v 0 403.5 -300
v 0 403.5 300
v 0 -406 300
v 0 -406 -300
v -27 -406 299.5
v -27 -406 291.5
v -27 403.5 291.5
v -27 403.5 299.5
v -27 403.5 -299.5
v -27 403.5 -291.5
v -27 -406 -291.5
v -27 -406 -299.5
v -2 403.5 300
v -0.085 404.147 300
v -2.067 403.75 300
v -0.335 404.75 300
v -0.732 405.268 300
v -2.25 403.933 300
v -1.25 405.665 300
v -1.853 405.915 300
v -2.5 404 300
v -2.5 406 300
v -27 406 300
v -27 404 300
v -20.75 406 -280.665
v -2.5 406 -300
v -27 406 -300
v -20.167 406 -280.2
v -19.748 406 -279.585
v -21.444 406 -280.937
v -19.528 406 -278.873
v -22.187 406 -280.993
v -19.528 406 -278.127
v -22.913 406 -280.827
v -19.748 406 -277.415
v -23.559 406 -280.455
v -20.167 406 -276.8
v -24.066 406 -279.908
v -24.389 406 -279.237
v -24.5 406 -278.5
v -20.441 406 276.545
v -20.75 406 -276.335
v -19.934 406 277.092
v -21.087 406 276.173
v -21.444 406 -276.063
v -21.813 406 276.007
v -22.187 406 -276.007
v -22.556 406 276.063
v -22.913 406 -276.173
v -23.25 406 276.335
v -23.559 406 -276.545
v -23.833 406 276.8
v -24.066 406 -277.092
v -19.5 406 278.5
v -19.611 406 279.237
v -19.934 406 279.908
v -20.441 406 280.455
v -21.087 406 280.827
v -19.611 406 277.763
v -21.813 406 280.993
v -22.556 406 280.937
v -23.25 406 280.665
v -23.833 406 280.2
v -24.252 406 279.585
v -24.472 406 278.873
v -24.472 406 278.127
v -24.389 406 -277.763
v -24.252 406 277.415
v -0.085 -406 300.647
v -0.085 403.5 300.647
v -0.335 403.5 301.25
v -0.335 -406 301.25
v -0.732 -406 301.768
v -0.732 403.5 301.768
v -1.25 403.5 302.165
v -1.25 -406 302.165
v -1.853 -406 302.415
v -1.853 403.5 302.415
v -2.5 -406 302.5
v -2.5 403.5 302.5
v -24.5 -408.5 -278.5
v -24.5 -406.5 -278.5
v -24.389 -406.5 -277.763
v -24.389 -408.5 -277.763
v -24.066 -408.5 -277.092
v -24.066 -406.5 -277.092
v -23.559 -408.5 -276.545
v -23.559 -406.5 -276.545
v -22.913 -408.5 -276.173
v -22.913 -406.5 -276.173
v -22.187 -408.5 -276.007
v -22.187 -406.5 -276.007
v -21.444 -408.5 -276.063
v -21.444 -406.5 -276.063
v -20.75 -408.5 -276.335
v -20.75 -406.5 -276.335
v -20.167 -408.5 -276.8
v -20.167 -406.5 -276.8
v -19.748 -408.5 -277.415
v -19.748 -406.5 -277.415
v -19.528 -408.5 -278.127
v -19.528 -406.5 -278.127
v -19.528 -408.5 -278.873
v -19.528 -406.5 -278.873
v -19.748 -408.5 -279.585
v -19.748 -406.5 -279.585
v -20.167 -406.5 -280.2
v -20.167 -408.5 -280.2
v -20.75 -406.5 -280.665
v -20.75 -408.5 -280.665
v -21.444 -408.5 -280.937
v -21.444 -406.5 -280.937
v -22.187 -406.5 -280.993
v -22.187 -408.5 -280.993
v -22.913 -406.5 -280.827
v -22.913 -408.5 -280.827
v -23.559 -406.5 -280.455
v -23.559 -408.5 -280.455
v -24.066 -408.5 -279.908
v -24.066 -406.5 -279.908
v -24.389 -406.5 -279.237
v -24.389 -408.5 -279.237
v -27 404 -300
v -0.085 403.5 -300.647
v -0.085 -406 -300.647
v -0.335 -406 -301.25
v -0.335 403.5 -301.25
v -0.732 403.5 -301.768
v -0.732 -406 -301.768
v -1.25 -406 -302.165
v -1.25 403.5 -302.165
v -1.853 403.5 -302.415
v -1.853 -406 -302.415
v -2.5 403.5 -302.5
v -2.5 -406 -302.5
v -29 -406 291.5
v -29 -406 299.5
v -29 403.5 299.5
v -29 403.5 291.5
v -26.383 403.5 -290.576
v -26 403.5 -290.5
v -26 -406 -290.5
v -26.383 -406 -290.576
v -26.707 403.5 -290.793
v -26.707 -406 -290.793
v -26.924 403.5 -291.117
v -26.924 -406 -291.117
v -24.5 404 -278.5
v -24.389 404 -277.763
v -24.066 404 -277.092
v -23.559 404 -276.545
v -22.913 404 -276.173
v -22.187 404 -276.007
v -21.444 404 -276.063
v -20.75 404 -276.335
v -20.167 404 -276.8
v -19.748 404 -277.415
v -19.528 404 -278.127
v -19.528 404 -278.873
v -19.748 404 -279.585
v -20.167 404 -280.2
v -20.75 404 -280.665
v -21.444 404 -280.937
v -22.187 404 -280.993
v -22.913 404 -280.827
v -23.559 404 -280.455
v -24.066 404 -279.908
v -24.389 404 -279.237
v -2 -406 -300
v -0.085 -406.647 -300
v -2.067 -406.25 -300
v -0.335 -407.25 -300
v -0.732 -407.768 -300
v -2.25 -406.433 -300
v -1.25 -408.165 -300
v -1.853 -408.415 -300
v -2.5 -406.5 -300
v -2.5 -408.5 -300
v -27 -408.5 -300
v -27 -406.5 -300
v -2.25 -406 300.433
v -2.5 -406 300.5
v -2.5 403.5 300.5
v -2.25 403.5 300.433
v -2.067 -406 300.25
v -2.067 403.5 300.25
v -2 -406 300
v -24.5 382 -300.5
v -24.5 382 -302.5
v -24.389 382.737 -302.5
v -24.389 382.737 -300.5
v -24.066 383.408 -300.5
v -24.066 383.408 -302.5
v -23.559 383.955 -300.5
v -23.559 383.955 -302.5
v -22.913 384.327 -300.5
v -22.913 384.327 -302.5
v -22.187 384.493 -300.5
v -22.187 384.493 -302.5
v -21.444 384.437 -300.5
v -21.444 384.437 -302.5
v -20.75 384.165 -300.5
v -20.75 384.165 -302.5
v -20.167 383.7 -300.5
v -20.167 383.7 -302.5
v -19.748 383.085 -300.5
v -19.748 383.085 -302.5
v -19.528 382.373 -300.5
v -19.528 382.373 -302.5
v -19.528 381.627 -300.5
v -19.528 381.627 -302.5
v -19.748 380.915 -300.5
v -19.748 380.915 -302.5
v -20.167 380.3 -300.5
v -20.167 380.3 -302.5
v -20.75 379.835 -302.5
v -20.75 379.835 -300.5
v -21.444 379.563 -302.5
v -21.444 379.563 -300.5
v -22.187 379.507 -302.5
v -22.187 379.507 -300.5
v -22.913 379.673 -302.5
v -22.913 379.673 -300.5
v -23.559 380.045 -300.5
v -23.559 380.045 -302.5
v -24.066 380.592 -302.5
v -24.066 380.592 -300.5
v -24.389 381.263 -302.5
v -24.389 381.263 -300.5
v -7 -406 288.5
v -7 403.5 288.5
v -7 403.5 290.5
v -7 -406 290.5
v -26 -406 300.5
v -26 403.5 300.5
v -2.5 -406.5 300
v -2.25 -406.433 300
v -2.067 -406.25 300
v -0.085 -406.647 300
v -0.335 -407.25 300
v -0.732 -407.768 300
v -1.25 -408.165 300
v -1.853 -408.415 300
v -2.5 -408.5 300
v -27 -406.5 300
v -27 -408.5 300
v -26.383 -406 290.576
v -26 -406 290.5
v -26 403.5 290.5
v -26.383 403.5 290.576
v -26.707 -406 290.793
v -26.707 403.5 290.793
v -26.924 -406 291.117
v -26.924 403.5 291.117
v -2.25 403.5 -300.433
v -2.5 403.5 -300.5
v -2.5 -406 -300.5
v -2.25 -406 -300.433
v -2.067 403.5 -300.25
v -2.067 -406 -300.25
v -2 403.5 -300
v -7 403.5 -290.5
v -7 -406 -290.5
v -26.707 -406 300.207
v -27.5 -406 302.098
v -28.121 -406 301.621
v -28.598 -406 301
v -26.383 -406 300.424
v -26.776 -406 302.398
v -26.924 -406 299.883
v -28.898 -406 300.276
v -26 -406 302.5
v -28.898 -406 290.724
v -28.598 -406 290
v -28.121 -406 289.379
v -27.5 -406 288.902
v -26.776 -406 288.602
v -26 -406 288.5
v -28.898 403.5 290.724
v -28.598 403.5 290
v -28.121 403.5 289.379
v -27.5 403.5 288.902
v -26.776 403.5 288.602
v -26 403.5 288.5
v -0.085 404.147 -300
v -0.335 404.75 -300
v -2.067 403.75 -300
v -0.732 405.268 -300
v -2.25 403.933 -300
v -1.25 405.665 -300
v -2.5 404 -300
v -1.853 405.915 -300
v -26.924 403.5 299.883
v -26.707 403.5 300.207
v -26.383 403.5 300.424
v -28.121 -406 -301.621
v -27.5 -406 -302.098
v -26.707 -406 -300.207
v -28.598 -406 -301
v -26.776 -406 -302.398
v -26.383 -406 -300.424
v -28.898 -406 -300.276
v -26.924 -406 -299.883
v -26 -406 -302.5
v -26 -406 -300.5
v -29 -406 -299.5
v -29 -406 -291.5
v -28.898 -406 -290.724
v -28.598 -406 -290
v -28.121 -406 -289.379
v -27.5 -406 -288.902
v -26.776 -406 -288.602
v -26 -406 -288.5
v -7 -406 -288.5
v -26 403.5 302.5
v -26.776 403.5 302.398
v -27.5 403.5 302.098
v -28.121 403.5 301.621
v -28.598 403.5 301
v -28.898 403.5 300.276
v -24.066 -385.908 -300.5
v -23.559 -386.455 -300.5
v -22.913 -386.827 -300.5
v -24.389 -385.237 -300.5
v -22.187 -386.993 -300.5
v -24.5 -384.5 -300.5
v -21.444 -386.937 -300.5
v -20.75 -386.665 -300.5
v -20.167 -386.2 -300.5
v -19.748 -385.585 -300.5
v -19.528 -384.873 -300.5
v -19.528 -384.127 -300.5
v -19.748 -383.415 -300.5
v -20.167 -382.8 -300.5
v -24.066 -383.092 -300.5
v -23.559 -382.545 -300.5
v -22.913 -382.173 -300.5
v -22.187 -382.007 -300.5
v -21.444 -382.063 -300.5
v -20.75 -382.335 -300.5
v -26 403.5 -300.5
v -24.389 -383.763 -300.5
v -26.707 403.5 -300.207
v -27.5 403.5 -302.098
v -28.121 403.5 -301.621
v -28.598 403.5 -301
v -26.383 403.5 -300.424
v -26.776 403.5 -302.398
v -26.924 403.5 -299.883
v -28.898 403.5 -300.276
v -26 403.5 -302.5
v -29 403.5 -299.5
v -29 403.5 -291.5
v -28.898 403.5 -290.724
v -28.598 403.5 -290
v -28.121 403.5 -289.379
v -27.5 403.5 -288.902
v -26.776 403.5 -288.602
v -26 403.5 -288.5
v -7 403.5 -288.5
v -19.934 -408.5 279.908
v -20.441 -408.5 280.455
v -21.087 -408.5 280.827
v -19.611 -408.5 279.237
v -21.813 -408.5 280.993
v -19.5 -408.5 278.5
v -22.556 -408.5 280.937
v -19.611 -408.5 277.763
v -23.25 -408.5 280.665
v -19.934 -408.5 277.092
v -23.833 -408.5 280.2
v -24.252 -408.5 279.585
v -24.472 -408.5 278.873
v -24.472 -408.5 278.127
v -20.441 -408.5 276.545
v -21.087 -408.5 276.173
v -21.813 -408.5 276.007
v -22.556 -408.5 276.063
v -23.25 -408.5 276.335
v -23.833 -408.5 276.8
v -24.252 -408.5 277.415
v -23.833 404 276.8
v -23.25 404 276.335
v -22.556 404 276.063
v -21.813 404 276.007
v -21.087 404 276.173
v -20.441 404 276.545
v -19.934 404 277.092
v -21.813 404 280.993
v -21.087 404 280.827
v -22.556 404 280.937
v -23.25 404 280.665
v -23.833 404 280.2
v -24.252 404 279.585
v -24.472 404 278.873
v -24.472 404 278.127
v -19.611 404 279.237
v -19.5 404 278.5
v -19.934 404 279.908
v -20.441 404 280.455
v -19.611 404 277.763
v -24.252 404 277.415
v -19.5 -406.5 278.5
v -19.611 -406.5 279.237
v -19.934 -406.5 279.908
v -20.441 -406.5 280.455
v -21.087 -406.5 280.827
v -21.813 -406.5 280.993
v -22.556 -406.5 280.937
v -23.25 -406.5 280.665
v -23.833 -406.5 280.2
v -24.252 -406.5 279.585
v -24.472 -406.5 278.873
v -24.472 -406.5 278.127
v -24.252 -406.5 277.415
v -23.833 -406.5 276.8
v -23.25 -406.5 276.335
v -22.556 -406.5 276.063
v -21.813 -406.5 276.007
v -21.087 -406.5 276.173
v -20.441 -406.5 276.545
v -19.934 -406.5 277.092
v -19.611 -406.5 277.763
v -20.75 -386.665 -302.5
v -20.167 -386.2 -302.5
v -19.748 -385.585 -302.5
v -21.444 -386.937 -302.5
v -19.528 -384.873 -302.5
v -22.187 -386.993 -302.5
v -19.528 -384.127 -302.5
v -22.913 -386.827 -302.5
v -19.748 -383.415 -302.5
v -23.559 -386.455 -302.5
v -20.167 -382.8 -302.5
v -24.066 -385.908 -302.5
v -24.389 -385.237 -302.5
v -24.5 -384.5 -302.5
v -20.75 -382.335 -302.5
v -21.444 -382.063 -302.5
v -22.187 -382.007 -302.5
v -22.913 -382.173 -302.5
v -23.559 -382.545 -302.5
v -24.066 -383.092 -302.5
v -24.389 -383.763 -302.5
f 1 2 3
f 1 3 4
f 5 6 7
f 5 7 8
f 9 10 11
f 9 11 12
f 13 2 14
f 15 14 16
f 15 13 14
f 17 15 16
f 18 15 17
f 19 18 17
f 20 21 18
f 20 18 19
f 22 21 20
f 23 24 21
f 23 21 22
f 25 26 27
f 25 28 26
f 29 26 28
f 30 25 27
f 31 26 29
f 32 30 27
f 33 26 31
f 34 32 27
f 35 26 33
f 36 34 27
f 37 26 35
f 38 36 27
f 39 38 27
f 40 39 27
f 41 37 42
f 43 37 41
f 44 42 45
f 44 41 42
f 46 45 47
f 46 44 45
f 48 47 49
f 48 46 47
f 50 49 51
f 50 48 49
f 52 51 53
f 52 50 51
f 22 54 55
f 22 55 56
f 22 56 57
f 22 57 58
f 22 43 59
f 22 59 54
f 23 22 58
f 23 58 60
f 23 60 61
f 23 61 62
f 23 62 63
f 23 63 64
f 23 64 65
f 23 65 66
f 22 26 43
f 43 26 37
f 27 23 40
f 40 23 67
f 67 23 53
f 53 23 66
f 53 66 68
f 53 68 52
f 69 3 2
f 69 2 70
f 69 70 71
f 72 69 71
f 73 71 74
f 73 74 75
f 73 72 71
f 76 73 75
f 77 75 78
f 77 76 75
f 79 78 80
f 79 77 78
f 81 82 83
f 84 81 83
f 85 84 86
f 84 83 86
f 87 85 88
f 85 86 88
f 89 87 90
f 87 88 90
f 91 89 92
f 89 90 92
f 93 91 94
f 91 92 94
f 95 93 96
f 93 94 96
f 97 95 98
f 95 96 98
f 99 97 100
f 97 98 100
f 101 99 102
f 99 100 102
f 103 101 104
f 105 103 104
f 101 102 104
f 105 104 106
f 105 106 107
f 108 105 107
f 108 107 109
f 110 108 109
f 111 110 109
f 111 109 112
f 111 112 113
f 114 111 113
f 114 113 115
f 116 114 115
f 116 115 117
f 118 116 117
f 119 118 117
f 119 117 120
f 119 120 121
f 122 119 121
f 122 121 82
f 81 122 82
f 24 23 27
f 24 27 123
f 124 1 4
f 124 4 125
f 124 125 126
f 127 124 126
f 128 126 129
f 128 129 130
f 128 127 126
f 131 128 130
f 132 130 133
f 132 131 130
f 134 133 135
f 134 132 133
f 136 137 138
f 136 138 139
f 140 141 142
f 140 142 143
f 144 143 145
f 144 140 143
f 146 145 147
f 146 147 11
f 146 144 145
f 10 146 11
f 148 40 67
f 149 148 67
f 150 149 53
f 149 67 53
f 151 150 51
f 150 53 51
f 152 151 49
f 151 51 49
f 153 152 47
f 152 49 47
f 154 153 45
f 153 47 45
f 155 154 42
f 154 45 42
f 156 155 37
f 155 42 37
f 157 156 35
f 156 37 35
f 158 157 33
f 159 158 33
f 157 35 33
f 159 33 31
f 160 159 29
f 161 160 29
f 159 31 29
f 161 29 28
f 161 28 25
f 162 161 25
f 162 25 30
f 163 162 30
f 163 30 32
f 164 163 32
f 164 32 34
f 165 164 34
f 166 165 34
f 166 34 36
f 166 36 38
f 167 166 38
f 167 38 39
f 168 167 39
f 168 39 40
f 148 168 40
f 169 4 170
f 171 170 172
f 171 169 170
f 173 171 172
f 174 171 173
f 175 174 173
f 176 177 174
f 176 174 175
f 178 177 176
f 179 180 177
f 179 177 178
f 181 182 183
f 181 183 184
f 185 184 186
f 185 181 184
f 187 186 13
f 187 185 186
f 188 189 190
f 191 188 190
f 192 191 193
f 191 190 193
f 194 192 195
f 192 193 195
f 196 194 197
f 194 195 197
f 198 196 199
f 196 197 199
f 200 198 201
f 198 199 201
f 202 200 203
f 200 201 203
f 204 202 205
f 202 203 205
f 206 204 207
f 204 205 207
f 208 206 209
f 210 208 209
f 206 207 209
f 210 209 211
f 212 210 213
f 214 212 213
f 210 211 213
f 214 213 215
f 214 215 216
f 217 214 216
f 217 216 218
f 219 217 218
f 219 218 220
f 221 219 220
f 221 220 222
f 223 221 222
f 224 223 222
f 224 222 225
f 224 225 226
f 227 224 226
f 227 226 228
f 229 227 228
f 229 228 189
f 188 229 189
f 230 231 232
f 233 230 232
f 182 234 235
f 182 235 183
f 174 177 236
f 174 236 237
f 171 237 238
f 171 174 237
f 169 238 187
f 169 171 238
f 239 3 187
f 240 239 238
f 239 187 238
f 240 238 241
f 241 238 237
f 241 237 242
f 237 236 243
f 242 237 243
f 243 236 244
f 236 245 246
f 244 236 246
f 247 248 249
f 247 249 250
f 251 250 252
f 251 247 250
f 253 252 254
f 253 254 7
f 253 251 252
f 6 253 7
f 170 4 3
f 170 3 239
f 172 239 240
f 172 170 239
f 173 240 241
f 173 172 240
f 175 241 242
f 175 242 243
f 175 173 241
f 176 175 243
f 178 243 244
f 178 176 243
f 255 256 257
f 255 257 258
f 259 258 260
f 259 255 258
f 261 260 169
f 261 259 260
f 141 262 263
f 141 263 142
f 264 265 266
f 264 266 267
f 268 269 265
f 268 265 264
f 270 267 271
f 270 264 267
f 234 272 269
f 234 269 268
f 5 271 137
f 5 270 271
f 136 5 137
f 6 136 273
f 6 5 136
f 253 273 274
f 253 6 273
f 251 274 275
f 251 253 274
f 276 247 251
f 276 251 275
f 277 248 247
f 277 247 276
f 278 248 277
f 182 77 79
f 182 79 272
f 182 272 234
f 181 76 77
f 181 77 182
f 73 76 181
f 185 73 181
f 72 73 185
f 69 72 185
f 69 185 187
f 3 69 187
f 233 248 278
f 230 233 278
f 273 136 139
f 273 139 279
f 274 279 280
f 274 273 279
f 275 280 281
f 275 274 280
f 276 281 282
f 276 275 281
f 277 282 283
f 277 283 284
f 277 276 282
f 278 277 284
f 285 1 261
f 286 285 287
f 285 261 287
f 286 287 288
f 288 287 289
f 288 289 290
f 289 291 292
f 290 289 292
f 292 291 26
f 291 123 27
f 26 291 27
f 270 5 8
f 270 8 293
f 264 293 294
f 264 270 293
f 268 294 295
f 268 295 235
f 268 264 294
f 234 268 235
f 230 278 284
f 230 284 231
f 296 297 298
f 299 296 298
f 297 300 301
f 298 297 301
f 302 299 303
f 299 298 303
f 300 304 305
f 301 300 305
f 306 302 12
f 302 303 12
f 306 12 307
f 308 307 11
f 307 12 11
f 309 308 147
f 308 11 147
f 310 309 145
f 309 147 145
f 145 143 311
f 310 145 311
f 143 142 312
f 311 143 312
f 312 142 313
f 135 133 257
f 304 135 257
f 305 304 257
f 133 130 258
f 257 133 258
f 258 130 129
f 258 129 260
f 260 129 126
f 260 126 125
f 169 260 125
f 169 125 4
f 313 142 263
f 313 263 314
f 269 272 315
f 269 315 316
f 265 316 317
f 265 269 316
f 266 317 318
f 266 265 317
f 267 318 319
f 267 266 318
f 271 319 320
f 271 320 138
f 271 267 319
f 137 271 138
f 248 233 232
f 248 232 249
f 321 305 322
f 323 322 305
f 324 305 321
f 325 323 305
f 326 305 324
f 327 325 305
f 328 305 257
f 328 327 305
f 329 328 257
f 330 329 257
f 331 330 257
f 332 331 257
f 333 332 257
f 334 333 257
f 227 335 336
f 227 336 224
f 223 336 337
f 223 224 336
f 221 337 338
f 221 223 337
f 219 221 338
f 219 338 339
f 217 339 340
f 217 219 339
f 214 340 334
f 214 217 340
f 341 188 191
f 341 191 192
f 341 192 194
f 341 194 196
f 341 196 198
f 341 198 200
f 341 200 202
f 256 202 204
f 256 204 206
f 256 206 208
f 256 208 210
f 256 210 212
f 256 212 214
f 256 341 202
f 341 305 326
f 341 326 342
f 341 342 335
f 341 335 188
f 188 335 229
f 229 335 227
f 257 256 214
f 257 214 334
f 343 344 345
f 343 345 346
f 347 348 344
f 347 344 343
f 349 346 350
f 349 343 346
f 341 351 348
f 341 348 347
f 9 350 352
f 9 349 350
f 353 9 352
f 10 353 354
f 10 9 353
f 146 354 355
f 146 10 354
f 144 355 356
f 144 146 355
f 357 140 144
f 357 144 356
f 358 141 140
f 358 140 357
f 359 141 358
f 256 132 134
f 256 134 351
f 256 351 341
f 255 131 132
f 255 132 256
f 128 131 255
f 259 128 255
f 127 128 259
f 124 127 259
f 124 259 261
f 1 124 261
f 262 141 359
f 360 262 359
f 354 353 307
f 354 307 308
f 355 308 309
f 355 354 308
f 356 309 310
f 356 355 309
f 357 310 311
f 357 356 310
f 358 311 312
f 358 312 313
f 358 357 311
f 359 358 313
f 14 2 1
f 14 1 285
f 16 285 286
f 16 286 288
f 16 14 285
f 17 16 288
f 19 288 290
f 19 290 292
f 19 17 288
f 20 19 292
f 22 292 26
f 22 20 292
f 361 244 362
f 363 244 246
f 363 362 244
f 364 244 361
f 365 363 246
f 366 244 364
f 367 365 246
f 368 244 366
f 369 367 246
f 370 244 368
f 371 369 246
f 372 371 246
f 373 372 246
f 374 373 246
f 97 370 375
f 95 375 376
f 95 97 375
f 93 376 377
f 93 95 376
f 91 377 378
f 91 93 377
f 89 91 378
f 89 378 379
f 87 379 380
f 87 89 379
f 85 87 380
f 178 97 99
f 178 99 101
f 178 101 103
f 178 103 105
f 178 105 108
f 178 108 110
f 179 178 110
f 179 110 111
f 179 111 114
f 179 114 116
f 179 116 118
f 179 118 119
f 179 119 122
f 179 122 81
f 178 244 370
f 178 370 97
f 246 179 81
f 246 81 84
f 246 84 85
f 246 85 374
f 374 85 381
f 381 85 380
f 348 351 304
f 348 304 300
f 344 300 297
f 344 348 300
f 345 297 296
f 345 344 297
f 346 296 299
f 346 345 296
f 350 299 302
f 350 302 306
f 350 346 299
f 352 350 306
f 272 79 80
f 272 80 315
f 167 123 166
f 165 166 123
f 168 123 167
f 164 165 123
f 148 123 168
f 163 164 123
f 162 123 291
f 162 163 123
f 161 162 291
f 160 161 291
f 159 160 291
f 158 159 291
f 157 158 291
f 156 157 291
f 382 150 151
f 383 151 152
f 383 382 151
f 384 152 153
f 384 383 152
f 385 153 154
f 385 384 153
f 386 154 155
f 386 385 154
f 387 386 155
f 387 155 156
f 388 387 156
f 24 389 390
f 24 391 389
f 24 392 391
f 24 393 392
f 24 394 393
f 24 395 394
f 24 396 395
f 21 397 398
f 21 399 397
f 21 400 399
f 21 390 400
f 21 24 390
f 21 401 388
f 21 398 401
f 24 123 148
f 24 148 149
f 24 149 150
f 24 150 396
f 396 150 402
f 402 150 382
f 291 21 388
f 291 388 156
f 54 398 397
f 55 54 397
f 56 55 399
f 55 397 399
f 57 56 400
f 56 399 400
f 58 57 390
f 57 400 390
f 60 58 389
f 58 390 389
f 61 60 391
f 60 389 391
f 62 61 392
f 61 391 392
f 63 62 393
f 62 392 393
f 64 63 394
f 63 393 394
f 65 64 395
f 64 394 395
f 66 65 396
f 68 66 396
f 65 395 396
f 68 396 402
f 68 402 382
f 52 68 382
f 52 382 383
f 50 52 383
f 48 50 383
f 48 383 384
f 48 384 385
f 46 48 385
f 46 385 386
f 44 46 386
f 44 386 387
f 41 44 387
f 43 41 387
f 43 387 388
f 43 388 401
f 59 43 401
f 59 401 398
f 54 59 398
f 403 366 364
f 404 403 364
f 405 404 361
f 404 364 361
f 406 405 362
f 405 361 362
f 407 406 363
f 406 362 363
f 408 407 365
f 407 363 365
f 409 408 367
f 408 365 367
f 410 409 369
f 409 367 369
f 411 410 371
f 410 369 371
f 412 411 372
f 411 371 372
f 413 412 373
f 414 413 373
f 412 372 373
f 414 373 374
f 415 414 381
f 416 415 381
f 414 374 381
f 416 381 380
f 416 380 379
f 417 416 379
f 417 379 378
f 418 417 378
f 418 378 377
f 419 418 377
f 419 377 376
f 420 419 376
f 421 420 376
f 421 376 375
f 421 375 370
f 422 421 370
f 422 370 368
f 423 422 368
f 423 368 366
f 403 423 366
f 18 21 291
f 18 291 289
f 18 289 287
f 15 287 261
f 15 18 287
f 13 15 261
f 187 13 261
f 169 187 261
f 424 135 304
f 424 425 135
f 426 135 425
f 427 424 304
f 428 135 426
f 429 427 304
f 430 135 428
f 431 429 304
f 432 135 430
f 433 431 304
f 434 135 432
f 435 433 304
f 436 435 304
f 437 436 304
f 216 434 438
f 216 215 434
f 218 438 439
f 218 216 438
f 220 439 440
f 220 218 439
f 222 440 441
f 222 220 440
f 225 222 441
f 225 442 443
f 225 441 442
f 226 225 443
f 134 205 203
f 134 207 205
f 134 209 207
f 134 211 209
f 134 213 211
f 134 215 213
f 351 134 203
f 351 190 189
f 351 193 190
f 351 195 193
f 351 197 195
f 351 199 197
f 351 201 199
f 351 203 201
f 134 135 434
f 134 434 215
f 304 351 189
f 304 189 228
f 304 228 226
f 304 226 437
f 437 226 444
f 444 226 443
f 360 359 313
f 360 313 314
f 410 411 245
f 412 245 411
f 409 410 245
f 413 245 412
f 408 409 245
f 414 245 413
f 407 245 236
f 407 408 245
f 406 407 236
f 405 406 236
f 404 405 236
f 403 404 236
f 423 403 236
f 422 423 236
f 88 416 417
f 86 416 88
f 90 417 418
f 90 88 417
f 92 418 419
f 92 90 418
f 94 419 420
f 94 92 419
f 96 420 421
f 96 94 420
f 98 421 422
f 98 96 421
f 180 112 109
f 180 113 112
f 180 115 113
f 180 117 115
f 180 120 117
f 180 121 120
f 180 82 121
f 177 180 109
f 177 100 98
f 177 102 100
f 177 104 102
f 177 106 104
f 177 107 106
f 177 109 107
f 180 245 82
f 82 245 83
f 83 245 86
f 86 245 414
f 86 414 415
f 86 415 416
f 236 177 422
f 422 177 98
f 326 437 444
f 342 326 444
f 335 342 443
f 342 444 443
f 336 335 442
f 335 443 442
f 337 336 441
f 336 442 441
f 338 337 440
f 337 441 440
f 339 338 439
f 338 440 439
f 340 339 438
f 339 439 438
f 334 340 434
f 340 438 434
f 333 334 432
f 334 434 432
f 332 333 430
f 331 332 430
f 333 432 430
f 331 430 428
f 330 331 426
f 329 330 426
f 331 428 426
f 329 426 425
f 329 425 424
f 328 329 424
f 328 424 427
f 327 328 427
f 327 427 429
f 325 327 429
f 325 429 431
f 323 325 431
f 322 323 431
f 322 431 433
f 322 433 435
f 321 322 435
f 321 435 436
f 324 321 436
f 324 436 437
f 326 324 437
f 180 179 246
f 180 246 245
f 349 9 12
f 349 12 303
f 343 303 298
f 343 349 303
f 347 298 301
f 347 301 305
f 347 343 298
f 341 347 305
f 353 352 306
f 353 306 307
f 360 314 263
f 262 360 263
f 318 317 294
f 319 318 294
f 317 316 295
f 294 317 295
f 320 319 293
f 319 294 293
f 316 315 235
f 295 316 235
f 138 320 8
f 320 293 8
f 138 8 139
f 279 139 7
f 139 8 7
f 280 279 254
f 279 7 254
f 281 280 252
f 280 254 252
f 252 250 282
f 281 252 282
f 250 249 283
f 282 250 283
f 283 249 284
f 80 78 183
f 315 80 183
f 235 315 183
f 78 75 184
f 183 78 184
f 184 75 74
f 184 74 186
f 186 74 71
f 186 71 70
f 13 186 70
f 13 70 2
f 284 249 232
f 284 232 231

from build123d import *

# Parameters (mm, degrees)
SKETCH2_W                    = 600
SKETCH2_H                    = 812
BASE_FLANGE1_DEPTH           = 2
EDGE_FLANGE1_STRIP_W         = 9
EDGE_FLANGE1_STRIP_H         = 2
EDGE_FLANGE1_STRIP_CUT_DEPTH = 600
EDGE_FLANGE1_DEPTH           = 600
EDGE_FLANGE3_DEPTH           = 809.5
EDGE_FLANGE4_DEPTH           = 809.5
EDGE_FLANGE5_DEPTH           = 600
SKETCH22_R                   = 2.5
CUT_EXTRUDE1_DEPTH           = 870.278724001
SKETCH23_R                   = 2.5
CUT_EXTRUDE2_DEPTH           = 870.278724001
SKETCH24_R                   = 2.5
CUT_EXTRUDE3_DEPTH           = 25
EDGE_FLANGE6_STRIP_W         = 10
EDGE_FLANGE6_STRIP_H         = 2
EDGE_FLANGE6_STRIP_CUT_DEPTH = 809.5
EDGE_FLANGE6_DEPTH           = 809.5
EDGE_FLANGE7_STRIP_W         = 10
EDGE_FLANGE7_STRIP_H         = 2
EDGE_FLANGE7_STRIP_CUT_DEPTH = 809.5
EDGE_FLANGE7_DEPTH           = 809.5
EDGE_FLANGE8_STRIP_W         = 10
EDGE_FLANGE8_STRIP_H         = 2
EDGE_FLANGE8_STRIP_CUT_DEPTH = 809.5
EDGE_FLANGE8_DEPTH           = 809.5
EDGE_FLANGE9_STRIP_W         = 10
EDGE_FLANGE9_STRIP_H         = 2
EDGE_FLANGE9_STRIP_CUT_DEPTH = 809.5
EDGE_FLANGE9_DEPTH           = 809.5


# Sheet-metal steps are written as plain solids
with BuildPart() as part:
    # Sketch2 → Base-Flange1 (new body)
    with BuildSketch(Plane(origin=(0, 0, 0), x_dir=(0, 0, -1), z_dir=(1, 0, 0))):
        Rectangle(SKETCH2_W, SKETCH2_H)
    extrude(amount=-BASE_FLANGE1_DEPTH)

    # Edge-Flange1 strip (across the edge) → Edge-Flange1 strip cut (cut)
    with BuildSketch(Plane(origin=(-2, 406, 300), x_dir=(0, -1, 0), z_dir=(0, 0, -1))):
        with Locations((-2, -1)):
            Rectangle(EDGE_FLANGE1_STRIP_W, EDGE_FLANGE1_STRIP_H)
    extrude(amount=EDGE_FLANGE1_STRIP_CUT_DEPTH, mode=Mode.SUBTRACT)

    # Edge-Flange1 section (across the edge) → Edge-Flange1 (add)
    with BuildSketch(Plane(origin=(-2, 406, 300), x_dir=(0, -1, 0), z_dir=(0, 0, -1))):
        with BuildLine():
            Line((0, 0.5), (0, 25))
            Line((0, 25), (2, 25))
            Line((2, 25), (2, 0.5))
            ThreePointArc((2, 0.5), (2.146446609, 0.146446609), (2.5, 0))
            Line((2.5, 0), (2.5, -2))
            ThreePointArc((2.5, -2), (0.732233047, -1.267766953), (0, 0.5))
        make_face()
    extrude(amount=EDGE_FLANGE1_DEPTH)

    # Edge-Flange3 section (across the edge) → Edge-Flange3 (add)
    with BuildSketch(Plane(origin=(-2, -406, 300.5), x_dir=(0, 0, -1), z_dir=(0, 1, 0))):
        with BuildLine():
            Line((-2, 0.5), (-2, 25))
            Line((-2, 25), (0, 25))
            Line((0, 25), (0, 0.5))
            ThreePointArc((0, 0.5), (0.146446609, 0.146446609), (0.5, 0))
            Line((0.5, 0), (0.5, -2))
            ThreePointArc((0.5, -2), (-1.267766953, -1.267766953), (-2, 0.5))
        make_face()
    extrude(amount=EDGE_FLANGE3_DEPTH)

    # Edge-Flange4 section (across the edge) → Edge-Flange4 (add)
    with BuildSketch(Plane(origin=(-2, 403.5, -300.5), x_dir=(0, 0, 1), z_dir=(0, -1, 0))):
        with BuildLine():
            Line((-2, 0.5), (-2, 25))
            Line((-2, 25), (0, 25))
            Line((0, 25), (0, 0.5))
            ThreePointArc((0, 0.5), (0.146446609, 0.146446609), (0.5, 0))
            Line((0.5, 0), (0.5, -2))
            ThreePointArc((0.5, -2), (-1.267766953, -1.267766953), (-2, 0.5))
        make_face()
    extrude(amount=EDGE_FLANGE4_DEPTH)

    # Edge-Flange5 section (across the edge) → Edge-Flange5 (add)
    with BuildSketch(Plane(origin=(-2, -406.5, -300), x_dir=(0, 1, 0), z_dir=(0, 0, 1))):
        with BuildLine():
            Line((-2, 0.5), (-2, 25))
            Line((-2, 25), (0, 25))
            Line((0, 25), (0, 0.5))
            ThreePointArc((0, 0.5), (0.146446609, 0.146446609), (0.5, 0))
            Line((0.5, 0), (0.5, -2))
            ThreePointArc((0.5, -2), (-1.267766953, -1.267766953), (-2, 0.5))
        make_face()
    extrude(amount=EDGE_FLANGE5_DEPTH)

    # Sketch22 → Cut-Extrude1 (cut, through all)
    with BuildSketch(Plane.XZ.offset(408.5)):
        with Locations((-22, 278.5)):
            Circle(SKETCH22_R)
    extrude(amount=-CUT_EXTRUDE1_DEPTH, mode=Mode.SUBTRACT)

    # Sketch23 → Cut-Extrude2 (cut, through all)
    with BuildSketch(Plane(origin=(0, 406, 0), x_dir=(1, 0, 0), z_dir=(0, 1, 0))):
        with Locations(Location((-22, 278.5, 0), (0, 0, 180))):
            Circle(SKETCH23_R)
    extrude(amount=-CUT_EXTRUDE2_DEPTH, mode=Mode.SUBTRACT)

    # Sketch24 → Cut-Extrude3 (cut)
    with BuildSketch(Plane(origin=(0, 0, -302.5), x_dir=(-1, 0, 0), z_dir=(0, 0, -1))):
        with Locations((22, 382)):
            Circle(SKETCH24_R)
        with Locations((22, -384.5)):
            Circle(SKETCH24_R)
    extrude(amount=-CUT_EXTRUDE3_DEPTH, mode=Mode.SUBTRACT)

    # Edge-Flange6 strip (across the edge) → Edge-Flange6 strip cut (cut)
    with BuildSketch(Plane(origin=(-27, 403.5, -300.5), x_dir=(1, 0, 0), z_dir=(0, -1, 0))):
        with Locations((-4, -1)):
            Rectangle(EDGE_FLANGE6_STRIP_W, EDGE_FLANGE6_STRIP_H)
    extrude(amount=EDGE_FLANGE6_STRIP_CUT_DEPTH, mode=Mode.SUBTRACT)

    # Edge-Flange6 section (across the edge) → Edge-Flange6 (add)
    with BuildSketch(Plane(origin=(-27, 403.5, -300.5), x_dir=(1, 0, 0), z_dir=(0, -1, 0))):
        with BuildLine():
            Line((-2, 1), (-2, 10))
            Line((-2, 10), (0, 10))
            Line((0, 10), (0, 1))
            ThreePointArc((0, 1), (0.292893219, 0.292893219), (1, 0))
            Line((1, 0), (1, -2))
            ThreePointArc((1, -2), (-1.121320344, -1.121320344), (-2, 1))
        make_face()
    extrude(amount=EDGE_FLANGE6_DEPTH)

    # Edge-Flange7 strip (across the edge) → Edge-Flange7 strip cut (cut)
    with BuildSketch(Plane(origin=(-27, 403.5, -290.5), x_dir=(0, 0, -1), z_dir=(0, -1, 0))):
        with Locations((-4, -1)):
            Rectangle(EDGE_FLANGE7_STRIP_W, EDGE_FLANGE7_STRIP_H)
    extrude(amount=EDGE_FLANGE7_STRIP_CUT_DEPTH, mode=Mode.SUBTRACT)

    # Edge-Flange7 section (across the edge) → Edge-Flange7 (add)
    with BuildSketch(Plane(origin=(-27, 403.5, -290.5), x_dir=(0, 0, -1), z_dir=(0, -1, 0))):
        with BuildLine():
            Line((-2, 1), (-2, 20))
            Line((-2, 20), (0, 20))
            Line((0, 20), (0, 1))
            ThreePointArc((0, 1), (0.292893219, 0.292893219), (1, 0))
            Line((1, 0), (1, -2))
            ThreePointArc((1, -2), (-1.121320344, -1.121320344), (-2, 1))
        make_face()
    extrude(amount=EDGE_FLANGE7_DEPTH)

    # Edge-Flange8 strip (across the edge) → Edge-Flange8 strip cut (cut)
    with BuildSketch(Plane(origin=(-27, -406, 300.5), x_dir=(1, 0, 0), z_dir=(0, 1, 0))):
        with Locations((-4, -1)):
            Rectangle(EDGE_FLANGE8_STRIP_W, EDGE_FLANGE8_STRIP_H)
    extrude(amount=EDGE_FLANGE8_STRIP_CUT_DEPTH, mode=Mode.SUBTRACT)

    # Edge-Flange8 section (across the edge) → Edge-Flange8 (add)
    with BuildSketch(Plane(origin=(-27, -406, 300.5), x_dir=(1, 0, 0), z_dir=(0, 1, 0))):
        with BuildLine():
            Line((-2, 1), (-2, 10))
            Line((-2, 10), (0, 10))
            Line((0, 10), (0, 1))
            ThreePointArc((0, 1), (0.292893219, 0.292893219), (1, 0))
            Line((1, 0), (1, -2))
            ThreePointArc((1, -2), (-1.121320344, -1.121320344), (-2, 1))
        make_face()
    extrude(amount=EDGE_FLANGE8_DEPTH)

    # Edge-Flange9 strip (across the edge) → Edge-Flange9 strip cut (cut)
    with BuildSketch(Plane(origin=(-27, -406, 290.5), x_dir=(0, 0, 1), z_dir=(0, 1, 0))):
        with Locations((-4, -1)):
            Rectangle(EDGE_FLANGE9_STRIP_W, EDGE_FLANGE9_STRIP_H)
    extrude(amount=EDGE_FLANGE9_STRIP_CUT_DEPTH, mode=Mode.SUBTRACT)

    # Edge-Flange9 section (across the edge) → Edge-Flange9 (add)
    with BuildSketch(Plane(origin=(-27, -406, 290.5), x_dir=(0, 0, 1), z_dir=(0, 1, 0))):
        with BuildLine():
            Line((-2, 1), (-2, 20))
            Line((-2, 20), (0, 20))
            Line((0, 20), (0, 1))
            ThreePointArc((0, 1), (0.292893219, 0.292893219), (1, 0))
            Line((1, 0), (1, -2))
            ThreePointArc((1, -2), (-1.121320344, -1.121320344), (-2, 1))
        make_face()
    extrude(amount=EDGE_FLANGE9_DEPTH)


solid = part.part
